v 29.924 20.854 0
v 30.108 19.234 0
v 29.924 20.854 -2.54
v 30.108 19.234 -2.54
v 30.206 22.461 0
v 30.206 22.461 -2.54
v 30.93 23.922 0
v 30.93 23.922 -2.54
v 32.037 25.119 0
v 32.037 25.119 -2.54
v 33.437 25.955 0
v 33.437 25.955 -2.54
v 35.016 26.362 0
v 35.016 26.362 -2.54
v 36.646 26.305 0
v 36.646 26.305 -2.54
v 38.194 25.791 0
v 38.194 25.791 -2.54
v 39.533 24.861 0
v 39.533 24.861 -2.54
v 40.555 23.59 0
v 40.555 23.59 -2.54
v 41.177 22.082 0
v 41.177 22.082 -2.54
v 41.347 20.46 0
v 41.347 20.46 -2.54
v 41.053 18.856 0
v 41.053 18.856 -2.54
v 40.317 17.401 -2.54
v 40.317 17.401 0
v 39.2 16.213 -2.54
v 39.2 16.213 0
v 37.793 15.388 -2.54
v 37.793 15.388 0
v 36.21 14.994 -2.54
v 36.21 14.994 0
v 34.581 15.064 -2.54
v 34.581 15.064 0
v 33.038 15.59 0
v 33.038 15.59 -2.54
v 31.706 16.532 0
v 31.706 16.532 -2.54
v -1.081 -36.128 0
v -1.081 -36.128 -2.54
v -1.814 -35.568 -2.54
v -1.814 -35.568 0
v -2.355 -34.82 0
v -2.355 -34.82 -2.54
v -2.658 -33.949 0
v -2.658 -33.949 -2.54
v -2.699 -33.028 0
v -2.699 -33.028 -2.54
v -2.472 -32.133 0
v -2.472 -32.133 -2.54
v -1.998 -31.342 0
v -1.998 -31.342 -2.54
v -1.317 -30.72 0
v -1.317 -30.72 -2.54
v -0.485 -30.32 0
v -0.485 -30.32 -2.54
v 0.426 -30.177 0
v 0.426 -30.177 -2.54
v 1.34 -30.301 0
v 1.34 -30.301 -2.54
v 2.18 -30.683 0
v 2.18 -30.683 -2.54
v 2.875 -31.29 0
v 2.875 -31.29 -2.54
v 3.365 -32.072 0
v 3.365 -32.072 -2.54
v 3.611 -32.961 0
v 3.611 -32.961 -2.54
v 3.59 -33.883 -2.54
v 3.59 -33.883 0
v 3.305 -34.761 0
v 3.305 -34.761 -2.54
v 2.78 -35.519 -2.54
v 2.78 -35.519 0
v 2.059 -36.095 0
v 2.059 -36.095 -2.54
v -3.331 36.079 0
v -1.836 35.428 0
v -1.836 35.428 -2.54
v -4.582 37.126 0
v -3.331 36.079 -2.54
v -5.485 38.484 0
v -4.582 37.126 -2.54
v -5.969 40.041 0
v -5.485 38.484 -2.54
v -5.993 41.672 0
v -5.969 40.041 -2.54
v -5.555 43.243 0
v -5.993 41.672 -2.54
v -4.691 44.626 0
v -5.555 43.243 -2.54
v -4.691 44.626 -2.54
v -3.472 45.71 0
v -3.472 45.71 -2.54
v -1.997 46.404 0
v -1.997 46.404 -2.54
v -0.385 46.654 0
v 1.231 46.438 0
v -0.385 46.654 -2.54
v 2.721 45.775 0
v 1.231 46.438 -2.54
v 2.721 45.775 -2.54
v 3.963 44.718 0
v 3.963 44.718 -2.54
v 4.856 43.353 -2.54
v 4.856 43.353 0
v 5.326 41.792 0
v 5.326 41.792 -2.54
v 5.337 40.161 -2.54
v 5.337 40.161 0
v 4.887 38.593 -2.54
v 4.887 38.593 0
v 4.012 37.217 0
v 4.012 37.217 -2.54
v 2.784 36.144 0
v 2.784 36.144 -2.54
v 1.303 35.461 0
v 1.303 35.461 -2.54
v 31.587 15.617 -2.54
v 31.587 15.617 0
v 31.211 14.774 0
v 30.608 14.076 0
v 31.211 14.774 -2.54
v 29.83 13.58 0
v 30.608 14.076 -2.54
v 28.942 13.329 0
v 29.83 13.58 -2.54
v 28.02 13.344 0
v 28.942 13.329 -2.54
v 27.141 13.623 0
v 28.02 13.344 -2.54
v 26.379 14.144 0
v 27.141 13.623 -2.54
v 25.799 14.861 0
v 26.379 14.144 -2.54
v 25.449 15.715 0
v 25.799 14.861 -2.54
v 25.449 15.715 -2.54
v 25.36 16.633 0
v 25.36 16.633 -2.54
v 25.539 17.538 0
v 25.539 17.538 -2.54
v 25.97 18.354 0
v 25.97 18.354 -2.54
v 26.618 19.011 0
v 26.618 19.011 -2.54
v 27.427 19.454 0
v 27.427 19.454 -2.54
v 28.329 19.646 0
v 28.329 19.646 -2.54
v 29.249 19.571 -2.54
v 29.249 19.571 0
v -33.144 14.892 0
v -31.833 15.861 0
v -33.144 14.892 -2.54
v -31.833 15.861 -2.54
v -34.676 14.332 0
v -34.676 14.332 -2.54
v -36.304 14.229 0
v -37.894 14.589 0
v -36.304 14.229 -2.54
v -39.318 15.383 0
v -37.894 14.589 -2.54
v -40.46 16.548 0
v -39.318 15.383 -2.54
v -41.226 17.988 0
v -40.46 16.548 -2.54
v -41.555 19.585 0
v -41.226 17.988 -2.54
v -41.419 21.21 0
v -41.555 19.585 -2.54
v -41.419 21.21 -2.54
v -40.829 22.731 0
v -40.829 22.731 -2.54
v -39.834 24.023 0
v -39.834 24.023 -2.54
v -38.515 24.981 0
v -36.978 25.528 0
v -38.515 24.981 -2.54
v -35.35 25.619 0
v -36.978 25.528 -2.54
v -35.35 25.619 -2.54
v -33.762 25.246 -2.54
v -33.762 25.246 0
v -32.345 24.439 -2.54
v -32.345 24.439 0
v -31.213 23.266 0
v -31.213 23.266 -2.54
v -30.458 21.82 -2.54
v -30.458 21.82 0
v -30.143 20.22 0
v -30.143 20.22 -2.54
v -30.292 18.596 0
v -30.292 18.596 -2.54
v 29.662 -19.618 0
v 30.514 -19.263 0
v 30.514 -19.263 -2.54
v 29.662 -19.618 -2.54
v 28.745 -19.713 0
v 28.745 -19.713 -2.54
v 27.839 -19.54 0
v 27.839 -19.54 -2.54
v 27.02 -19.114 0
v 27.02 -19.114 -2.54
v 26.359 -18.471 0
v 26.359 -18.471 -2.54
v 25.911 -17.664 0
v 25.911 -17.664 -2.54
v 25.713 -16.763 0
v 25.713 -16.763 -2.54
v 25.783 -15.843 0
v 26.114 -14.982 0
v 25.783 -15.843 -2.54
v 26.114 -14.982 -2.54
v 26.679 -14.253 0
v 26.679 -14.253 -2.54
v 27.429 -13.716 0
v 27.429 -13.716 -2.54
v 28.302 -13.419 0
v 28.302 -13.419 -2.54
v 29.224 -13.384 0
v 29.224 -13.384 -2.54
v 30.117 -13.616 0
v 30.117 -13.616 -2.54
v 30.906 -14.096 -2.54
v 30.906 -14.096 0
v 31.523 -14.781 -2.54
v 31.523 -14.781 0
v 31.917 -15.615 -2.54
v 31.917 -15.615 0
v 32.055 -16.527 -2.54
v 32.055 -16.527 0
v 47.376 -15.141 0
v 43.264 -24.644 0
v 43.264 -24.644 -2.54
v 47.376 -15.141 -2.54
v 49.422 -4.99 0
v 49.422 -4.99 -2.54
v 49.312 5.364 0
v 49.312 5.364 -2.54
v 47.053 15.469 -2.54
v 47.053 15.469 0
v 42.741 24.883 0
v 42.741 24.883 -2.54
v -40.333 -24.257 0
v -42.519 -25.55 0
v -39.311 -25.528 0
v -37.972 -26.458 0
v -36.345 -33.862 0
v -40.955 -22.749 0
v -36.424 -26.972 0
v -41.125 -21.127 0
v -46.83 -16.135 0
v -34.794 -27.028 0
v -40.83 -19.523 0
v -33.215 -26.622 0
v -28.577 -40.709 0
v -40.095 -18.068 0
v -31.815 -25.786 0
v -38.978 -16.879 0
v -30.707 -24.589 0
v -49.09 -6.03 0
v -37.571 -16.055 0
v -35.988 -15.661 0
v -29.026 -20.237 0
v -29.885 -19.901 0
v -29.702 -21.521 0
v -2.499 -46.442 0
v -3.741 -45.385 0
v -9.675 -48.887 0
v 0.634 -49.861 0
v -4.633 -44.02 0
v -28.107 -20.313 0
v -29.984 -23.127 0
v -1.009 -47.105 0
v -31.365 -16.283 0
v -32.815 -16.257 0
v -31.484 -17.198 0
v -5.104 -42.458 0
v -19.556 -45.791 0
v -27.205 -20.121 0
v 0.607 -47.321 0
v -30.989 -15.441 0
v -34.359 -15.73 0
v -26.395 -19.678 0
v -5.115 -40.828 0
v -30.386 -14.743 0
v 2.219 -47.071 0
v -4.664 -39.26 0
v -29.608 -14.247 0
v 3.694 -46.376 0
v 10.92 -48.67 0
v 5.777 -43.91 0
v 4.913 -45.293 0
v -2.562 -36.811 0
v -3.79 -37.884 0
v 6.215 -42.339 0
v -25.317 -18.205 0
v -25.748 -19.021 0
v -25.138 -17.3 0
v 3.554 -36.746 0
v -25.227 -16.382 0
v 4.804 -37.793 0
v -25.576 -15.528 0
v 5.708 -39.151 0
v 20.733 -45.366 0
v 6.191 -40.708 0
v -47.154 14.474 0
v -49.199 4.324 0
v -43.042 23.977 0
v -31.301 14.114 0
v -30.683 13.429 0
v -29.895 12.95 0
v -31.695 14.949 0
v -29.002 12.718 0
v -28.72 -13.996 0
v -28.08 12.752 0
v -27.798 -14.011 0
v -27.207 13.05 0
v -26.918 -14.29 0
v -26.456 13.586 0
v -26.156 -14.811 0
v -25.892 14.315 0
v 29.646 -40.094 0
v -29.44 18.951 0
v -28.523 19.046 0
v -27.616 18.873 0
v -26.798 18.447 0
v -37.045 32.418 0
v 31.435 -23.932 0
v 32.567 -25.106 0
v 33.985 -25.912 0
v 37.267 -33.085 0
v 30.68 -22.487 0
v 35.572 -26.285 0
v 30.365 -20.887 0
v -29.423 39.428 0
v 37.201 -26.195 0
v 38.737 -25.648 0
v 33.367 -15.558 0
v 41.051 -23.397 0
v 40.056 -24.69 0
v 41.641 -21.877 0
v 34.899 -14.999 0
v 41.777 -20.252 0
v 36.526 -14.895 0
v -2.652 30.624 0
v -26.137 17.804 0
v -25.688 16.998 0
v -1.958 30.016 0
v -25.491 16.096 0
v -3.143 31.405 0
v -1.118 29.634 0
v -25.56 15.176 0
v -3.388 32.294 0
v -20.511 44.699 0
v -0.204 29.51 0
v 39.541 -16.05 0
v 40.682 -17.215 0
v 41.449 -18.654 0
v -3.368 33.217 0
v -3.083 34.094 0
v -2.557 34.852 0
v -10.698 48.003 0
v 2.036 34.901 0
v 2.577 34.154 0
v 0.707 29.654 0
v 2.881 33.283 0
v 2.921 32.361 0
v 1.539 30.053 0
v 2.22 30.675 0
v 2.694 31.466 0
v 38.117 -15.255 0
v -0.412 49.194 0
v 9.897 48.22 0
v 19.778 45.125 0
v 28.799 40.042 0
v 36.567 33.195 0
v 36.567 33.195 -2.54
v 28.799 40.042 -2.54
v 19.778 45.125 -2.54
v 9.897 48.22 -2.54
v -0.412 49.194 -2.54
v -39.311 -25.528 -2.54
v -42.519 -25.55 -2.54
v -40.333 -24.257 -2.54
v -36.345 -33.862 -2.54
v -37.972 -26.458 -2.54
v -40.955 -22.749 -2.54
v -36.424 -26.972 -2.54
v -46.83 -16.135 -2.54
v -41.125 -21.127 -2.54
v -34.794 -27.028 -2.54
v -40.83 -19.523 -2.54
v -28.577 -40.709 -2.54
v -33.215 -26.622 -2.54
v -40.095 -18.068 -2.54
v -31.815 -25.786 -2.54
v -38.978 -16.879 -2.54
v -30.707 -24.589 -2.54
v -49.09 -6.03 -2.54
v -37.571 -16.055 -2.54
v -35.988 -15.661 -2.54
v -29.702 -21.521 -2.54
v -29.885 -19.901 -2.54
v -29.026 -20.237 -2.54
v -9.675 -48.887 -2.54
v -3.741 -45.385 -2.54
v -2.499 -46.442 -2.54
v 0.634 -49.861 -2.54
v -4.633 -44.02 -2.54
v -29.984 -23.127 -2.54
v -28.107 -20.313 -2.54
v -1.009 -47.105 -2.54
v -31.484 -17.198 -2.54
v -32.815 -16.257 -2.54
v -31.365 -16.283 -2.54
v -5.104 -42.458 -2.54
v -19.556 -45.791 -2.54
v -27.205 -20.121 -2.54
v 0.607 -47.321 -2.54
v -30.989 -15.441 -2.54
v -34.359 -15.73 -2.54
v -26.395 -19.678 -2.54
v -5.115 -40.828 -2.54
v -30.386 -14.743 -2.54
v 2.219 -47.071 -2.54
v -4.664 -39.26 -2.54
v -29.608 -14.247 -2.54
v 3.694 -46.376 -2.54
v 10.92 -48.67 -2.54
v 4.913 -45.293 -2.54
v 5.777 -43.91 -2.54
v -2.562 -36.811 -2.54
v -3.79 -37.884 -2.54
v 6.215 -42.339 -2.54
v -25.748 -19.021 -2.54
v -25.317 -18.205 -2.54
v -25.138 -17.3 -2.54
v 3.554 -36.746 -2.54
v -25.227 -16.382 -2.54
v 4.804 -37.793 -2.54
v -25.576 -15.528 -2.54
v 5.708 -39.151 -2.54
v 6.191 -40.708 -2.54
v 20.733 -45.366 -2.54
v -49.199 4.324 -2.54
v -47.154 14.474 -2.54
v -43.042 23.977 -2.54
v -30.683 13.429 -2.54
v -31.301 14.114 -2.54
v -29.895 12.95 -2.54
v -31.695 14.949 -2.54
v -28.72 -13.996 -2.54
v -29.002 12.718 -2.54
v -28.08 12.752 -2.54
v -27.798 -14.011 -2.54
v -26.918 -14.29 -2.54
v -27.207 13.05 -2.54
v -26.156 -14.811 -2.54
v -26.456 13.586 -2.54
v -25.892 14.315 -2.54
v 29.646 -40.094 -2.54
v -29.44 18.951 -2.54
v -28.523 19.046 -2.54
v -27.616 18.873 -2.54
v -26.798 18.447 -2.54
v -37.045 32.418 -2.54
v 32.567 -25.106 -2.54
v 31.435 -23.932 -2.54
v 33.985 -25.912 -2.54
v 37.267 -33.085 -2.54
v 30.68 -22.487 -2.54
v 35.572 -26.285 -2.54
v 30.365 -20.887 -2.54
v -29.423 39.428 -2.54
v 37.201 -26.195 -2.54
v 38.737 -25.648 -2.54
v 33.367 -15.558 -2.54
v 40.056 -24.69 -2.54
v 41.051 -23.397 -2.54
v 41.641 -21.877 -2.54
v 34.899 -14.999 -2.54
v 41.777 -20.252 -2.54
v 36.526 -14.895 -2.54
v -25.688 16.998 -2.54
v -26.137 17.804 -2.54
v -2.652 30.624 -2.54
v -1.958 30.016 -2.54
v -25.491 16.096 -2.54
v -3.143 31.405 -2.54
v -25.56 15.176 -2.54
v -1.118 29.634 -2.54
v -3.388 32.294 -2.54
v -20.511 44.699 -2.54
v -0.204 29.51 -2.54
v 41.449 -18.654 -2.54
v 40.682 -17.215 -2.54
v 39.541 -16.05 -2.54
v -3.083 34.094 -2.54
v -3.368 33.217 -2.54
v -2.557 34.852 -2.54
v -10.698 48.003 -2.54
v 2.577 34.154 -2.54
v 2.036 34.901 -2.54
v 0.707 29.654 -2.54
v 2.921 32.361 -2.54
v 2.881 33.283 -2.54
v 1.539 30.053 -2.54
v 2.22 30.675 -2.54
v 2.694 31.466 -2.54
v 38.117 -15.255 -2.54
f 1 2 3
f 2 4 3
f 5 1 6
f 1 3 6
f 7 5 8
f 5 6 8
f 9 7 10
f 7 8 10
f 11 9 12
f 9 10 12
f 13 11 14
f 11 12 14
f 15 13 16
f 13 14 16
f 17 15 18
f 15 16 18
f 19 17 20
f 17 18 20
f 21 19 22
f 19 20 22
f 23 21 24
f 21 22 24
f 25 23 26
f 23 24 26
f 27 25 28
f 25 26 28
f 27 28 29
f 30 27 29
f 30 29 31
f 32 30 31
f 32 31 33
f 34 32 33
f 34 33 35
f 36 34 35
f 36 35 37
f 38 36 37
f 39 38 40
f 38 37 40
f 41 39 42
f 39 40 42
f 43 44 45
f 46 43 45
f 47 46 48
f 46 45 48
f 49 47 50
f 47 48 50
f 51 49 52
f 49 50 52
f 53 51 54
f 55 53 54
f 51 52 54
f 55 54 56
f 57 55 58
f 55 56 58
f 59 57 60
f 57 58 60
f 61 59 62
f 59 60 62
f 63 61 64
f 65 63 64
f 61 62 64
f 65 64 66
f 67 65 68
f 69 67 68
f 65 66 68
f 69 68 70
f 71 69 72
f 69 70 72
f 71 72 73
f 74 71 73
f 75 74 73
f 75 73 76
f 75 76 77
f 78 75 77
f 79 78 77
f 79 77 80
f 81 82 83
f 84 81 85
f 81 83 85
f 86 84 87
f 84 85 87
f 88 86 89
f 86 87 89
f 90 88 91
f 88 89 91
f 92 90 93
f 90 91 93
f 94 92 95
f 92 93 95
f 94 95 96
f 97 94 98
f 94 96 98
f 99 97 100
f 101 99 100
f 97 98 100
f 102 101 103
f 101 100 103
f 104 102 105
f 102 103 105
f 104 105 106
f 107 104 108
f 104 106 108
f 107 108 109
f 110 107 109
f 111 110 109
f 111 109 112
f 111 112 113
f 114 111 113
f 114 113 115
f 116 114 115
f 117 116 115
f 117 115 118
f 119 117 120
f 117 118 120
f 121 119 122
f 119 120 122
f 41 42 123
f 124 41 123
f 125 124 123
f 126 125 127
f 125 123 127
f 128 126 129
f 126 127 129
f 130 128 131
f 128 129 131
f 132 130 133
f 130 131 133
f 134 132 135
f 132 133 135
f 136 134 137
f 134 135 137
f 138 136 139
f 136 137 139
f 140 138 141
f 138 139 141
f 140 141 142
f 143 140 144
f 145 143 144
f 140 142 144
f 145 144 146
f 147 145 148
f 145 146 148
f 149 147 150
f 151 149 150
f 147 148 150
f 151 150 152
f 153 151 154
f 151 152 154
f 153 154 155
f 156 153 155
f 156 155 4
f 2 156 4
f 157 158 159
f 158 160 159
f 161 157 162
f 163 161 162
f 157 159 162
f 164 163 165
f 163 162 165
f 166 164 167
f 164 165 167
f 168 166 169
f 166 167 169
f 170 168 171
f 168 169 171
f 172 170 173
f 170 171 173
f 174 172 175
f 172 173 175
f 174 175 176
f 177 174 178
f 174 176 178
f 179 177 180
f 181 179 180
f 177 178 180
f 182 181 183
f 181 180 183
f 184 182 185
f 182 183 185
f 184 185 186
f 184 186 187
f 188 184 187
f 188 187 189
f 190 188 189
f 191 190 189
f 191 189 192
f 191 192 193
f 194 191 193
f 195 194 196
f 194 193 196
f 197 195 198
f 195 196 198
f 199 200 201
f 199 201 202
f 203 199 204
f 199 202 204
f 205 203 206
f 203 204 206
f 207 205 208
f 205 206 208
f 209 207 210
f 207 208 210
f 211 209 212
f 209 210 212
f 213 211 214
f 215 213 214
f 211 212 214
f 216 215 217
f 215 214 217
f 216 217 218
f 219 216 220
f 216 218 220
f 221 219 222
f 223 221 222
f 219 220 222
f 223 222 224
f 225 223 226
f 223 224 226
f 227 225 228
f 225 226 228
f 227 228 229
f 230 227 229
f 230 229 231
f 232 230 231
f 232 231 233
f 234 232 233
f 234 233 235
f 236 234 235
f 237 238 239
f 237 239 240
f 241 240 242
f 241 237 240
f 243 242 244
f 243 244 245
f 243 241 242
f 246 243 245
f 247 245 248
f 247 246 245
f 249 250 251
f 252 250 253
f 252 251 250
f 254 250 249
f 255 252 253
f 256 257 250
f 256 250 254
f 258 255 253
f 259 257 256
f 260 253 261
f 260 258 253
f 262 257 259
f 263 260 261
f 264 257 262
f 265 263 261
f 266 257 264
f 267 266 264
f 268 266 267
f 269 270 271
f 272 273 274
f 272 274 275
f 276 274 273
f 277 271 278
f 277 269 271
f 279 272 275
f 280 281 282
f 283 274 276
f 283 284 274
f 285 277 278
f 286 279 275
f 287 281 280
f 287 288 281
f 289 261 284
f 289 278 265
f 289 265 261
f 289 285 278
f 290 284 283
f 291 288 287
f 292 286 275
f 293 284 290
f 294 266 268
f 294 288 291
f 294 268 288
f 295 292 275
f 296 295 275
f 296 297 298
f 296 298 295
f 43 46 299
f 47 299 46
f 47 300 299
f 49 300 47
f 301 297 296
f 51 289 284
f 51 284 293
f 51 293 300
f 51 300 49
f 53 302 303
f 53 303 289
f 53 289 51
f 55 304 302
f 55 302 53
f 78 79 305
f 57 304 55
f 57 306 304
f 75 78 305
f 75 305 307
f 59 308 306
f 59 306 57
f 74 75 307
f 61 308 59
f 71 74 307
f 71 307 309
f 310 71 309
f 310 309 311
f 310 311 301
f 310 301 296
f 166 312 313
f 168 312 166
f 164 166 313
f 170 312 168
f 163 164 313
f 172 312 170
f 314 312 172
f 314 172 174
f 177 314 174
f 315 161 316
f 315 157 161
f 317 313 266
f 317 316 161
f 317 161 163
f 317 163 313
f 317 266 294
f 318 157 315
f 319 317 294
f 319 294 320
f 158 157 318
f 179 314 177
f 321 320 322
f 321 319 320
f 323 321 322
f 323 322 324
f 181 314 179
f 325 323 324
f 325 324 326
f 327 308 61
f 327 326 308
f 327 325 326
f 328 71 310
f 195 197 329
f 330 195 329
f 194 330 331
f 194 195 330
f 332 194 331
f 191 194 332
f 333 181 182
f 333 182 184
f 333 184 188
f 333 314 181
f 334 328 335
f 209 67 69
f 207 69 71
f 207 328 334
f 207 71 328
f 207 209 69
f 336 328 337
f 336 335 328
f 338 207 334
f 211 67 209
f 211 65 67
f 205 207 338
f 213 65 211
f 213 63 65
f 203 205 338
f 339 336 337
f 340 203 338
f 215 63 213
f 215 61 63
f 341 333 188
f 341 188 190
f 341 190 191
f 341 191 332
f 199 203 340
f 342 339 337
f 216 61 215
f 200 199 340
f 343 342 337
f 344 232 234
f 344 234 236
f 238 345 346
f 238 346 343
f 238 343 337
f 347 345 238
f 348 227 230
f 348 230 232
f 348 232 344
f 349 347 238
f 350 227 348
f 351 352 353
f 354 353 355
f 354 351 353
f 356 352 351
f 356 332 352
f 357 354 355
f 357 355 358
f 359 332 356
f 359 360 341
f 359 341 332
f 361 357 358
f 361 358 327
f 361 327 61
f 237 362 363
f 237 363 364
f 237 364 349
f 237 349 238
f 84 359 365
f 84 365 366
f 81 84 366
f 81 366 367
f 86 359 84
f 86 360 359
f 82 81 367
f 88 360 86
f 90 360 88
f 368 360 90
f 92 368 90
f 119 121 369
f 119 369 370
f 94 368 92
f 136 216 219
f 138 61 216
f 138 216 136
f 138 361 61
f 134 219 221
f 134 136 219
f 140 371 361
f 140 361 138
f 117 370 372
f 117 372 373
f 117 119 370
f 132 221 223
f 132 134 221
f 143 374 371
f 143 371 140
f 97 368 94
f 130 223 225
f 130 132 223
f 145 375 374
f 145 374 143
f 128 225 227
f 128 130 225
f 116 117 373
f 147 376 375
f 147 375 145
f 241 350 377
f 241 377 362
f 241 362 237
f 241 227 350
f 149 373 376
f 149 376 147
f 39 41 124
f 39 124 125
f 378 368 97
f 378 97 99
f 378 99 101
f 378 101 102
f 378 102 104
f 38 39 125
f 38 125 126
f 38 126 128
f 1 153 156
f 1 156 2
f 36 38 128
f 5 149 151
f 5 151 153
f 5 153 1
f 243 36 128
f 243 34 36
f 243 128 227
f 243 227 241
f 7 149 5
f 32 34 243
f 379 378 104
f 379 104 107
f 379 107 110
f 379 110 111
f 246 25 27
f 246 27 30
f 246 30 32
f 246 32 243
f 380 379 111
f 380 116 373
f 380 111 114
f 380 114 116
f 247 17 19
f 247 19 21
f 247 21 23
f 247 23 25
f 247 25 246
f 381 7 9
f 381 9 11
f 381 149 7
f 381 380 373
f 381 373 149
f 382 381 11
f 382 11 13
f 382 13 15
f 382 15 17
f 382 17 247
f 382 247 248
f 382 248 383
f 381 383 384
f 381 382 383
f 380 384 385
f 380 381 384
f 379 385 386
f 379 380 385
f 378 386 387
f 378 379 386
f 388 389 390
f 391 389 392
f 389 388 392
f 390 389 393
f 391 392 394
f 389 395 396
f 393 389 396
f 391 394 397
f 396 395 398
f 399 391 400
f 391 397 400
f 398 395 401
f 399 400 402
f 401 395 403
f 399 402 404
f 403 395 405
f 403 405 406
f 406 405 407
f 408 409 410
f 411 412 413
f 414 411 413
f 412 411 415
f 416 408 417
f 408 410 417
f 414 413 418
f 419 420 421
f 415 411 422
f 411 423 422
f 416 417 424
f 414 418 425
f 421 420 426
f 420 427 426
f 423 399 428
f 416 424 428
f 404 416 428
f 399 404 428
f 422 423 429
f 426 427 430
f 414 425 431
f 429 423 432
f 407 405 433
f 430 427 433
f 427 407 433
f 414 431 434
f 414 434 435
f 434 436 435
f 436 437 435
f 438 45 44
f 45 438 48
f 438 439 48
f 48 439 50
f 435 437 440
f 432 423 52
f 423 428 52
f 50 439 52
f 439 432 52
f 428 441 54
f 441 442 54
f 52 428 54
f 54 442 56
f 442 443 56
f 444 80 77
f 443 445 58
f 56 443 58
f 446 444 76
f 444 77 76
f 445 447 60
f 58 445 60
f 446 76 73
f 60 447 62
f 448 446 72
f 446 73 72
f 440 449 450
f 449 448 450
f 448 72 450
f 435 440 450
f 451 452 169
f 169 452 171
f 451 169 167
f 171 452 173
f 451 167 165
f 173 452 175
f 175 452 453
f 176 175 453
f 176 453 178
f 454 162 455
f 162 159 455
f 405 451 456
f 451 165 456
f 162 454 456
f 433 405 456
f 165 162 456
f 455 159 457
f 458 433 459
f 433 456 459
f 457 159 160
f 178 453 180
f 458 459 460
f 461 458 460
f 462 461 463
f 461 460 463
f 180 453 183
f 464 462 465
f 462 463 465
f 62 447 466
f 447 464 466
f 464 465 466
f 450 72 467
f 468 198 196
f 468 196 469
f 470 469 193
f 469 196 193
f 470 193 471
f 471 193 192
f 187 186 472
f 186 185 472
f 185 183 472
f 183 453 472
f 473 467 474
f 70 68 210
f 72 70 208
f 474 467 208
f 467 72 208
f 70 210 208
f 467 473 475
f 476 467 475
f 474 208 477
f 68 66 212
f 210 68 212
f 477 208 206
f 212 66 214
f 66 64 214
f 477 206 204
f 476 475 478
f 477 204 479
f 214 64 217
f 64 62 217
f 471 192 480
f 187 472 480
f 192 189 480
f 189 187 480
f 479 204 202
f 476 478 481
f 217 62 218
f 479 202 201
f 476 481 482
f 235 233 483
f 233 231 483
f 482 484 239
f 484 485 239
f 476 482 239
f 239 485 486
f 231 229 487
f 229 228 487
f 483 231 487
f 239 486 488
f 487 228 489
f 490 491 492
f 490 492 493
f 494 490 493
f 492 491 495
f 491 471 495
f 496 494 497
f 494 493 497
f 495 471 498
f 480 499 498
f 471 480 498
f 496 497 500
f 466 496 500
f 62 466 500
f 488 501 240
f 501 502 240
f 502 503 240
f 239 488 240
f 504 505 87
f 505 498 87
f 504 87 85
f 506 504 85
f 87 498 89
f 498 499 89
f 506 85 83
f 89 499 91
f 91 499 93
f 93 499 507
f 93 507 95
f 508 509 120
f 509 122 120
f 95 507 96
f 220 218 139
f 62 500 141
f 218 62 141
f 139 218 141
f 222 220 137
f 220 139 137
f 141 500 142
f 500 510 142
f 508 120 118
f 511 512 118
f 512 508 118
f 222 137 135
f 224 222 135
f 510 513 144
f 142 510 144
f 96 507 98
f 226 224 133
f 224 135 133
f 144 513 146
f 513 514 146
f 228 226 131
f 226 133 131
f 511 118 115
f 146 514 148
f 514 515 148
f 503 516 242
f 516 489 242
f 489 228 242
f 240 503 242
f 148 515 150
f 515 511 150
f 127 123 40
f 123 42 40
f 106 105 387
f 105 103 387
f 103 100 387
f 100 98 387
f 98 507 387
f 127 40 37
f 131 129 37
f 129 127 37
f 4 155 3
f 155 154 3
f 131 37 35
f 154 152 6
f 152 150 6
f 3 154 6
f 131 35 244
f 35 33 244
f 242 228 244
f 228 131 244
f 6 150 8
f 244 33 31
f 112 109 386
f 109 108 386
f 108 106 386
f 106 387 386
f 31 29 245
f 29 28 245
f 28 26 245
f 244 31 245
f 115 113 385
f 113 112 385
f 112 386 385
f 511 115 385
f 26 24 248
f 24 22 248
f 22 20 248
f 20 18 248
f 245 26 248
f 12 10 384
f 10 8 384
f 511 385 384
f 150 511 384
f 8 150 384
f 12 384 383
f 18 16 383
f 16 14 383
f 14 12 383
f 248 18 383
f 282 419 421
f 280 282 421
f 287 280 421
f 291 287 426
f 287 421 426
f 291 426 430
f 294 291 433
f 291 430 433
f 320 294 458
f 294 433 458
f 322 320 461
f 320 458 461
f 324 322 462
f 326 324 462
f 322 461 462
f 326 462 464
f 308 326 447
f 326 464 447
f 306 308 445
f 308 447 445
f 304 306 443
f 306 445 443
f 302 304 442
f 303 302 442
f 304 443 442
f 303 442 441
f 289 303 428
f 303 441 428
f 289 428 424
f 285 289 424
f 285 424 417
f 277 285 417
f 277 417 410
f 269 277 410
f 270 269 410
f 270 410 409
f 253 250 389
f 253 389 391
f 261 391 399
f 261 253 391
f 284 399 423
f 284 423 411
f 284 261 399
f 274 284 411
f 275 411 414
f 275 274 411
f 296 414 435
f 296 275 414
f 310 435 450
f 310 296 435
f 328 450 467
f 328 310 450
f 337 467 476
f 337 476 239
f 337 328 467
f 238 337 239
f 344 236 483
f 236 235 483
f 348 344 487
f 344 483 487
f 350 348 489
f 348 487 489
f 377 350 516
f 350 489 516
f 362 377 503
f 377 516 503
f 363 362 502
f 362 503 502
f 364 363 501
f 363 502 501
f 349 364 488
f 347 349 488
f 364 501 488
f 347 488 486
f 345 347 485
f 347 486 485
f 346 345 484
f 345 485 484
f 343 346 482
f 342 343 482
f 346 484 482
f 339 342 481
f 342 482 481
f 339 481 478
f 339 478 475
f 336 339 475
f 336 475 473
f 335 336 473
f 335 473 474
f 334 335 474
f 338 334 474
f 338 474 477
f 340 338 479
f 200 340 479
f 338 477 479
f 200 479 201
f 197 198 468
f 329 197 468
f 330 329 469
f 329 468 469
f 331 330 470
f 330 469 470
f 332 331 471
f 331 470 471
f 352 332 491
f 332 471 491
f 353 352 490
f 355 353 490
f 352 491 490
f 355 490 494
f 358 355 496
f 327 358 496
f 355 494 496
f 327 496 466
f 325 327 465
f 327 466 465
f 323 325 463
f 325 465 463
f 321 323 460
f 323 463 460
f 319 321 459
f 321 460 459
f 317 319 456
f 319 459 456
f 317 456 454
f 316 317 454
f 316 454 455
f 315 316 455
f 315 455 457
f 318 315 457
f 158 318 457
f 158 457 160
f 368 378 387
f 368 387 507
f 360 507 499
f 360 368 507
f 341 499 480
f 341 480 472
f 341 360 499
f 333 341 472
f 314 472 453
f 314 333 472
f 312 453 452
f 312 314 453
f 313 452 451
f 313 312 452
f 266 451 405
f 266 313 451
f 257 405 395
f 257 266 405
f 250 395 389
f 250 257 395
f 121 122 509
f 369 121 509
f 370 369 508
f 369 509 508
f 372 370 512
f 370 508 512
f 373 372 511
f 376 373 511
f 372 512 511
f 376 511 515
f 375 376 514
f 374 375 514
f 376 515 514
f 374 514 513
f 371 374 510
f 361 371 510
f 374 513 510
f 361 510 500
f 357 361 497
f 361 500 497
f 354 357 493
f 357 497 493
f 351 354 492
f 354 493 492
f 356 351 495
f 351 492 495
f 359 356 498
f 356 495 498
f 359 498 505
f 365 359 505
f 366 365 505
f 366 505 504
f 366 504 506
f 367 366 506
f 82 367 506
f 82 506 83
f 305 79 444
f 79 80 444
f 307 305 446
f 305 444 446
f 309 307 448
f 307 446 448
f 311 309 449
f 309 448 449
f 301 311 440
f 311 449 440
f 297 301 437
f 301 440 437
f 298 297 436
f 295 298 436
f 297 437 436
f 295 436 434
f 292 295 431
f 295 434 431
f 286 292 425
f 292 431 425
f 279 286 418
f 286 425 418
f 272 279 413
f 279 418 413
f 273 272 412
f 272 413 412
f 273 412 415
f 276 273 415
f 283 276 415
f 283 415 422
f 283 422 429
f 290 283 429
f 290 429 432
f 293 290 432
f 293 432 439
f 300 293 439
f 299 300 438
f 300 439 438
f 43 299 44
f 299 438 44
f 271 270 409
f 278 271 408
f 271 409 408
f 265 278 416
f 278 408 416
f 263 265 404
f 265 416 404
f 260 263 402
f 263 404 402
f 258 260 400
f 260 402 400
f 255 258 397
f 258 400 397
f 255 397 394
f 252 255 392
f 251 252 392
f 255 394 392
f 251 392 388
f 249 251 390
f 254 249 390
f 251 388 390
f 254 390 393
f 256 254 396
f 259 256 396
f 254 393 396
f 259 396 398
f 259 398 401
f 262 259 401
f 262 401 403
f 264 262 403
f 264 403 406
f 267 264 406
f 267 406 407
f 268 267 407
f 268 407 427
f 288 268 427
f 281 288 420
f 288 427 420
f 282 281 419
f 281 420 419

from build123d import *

# Parameters (mm, degrees)
F1_DEPTH = 2.54
F2_D     = 11.43
F3_D     = 6.35


with BuildPart() as f1:
    # F0 (on Top) → F1 (new body)
    with BuildSketch(Plane.XY):
        with BuildLine():
            ThreePointArc((14.1469296791, 24.581208667), (28.3570527779, 32.9867129725), (42.7414945684, 24.8831374968))
            ThreePointArc((42.7414945684, 24.8831374968), (24.4218518628, 42.8199500657), (-0.4118303798, 49.1938641112))
            ThreePointArc((-0.4118303798, 49.1938641112), (11.3750266033, 44.4205864041), (16.2724880694, 32.6847843949))
            ThreePointArc((16.2724880694, 32.6847843949), (15.7322599992, 28.495931985), (14.1469296791, 24.581208667))
        make_face()
        with BuildLine():
            ThreePointArc((-14.4476350188, 24.2792801377), (-14.6219536378, 40.7883599496), (-0.4118303798, 49.1938641112))
            ThreePointArc((-0.4118303798, 49.1938641112), (-25.1053870129, 42.2969945819), (-43.0421996808, 23.9773521233))
            ThreePointArc((-43.0421996808, 23.9773521233), (-28.8320764588, 32.3828558193), (-14.4476350188, 24.2792801377))
        make_face()
        with BuildLine():
            ThreePointArc((-28.4834395144, -0.6353036127), (-42.8678814784, 7.4682721021), (-43.0421996808, 23.9773521233))
            ThreePointArc((-43.0421996808, 23.9773521233), (-49.4161139914, -0.8563299278), (-42.5192447927, -25.5498866402))
            ThreePointArc((-42.5192447927, -25.5498866402), (-42.6935625622, -9.0408072614), (-28.4834395144, -0.6353036127))
        make_face()
        with BuildLine():
            ThreePointArc((-42.5192447927, -25.5498866402), (-24.1996024135, -43.4866996437), (0.6340797732, -49.8606141921))
            ThreePointArc((0.6340797732, -49.8606141921), (-13.7503612776, -41.757037972), (-13.9246792181, -25.2479584958))
            ThreePointArc((-13.9246792181, -25.2479584958), (-28.1348028533, -33.6534630478), (-42.5192447927, -25.5498866402))
        make_face()
        with BuildLine():
            ThreePointArc((0.6340797732, -49.8606141921), (25.3276368535, -42.9637449392), (43.2644499105, -24.6441023627))
            ThreePointArc((43.2644499105, -24.6441023627), (29.0543267516, -33.0496058908), (14.6698854093, -24.9460303205))
            ThreePointArc((14.6698854093, -24.9460303205), (16.3844166198, -28.9943010133), (16.969762255, -33.351534466))
            ThreePointArc((16.969762255, -33.351534466), (12.1955639367, -44.9640733309), (0.6340797732, -49.8606141921))
        make_face()
        with BuildLine():
            ThreePointArc((43.2644499105, -24.6441023627), (48.0204409306, -12.8999323449), (49.6411251622, -0.3333750356))
            ThreePointArc((49.6411251622, -0.3333750356), (47.8850882419, 12.7383253763), (42.7414945684, 24.8831374968))
            ThreePointArc((42.7414945684, 24.8831374968), (44.4560258195, 20.8348667633), (45.0413714688, 16.4776332587))
            ThreePointArc((45.0413714688, 16.4776332587), (40.2671733446, 4.86509459), (28.7056895388, -0.0314464615))
            ThreePointArc((28.7056895388, -0.0314464615), (40.4925468917, -4.8047239608), (45.3900085616, -16.5405261717))
            ThreePointArc((45.3900085616, -16.5405261717), (44.8497804239, -20.7293788387), (43.2644499105, -24.6441023627))
        make_face()
        with BuildLine():
            ThreePointArc((14.6698854093, -24.9460303205), (29.0543267516, -33.0496058908), (43.2644499105, -24.6441023627))
            ThreePointArc((43.2644499105, -24.6441023627), (44.8497804239, -20.7293788387), (45.3900085616, -16.5405261717))
            ThreePointArc((45.3900085616, -16.5405261717), (40.4925468917, -4.8047239608), (28.7056895388, -0.0314464615))
            ThreePointArc((28.7056895388, -0.0314464615), (14.4955667445, -8.436950812), (14.6698854093, -24.9460303205))
        make_face()
        with BuildLine():
            ThreePointArc((-13.9246792181, -25.2479584958), (-13.7503612776, -41.757037972), (0.6340797732, -49.8606141921))
            ThreePointArc((0.6340797732, -49.8606141921), (12.1955639367, -44.9640733309), (16.969762255, -33.351534466))
            ThreePointArc((16.969762255, -33.351534466), (16.3844166198, -28.9943010133), (14.6698854093, -24.9460303205))
            ThreePointArc((14.6698854093, -24.9460303205), (0.2854439404, -16.8424547484), (-13.9246792181, -25.2479584958))
        make_face()
        with BuildLine():
            ThreePointArc((-28.4834395144, -0.6353036127), (-42.6935625622, -9.0408072614), (-42.5192447927, -25.5498866402))
            ThreePointArc((-42.5192447927, -25.5498866402), (-28.1348028533, -33.6534630478), (-13.9246792181, -25.2479584958))
            ThreePointArc((-13.9246792181, -25.2479584958), (-12.3393491328, -21.3332354278), (-11.7991211444, -17.1443833299))
            ThreePointArc((-11.7991211444, -17.1443833299), (-16.6965825823, -5.4085813485), (-28.4834395144, -0.6353036127))
        make_face()
        with BuildLine():
            ThreePointArc((-14.4476350188, 24.2792801377), (-28.8320764588, 32.3828558193), (-43.0421996808, 23.9773521233))
            ThreePointArc((-43.0421996808, 23.9773521233), (-42.8678814784, 7.4682721021), (-28.4834395144, -0.6353036127))
            ThreePointArc((-28.4834395144, -0.6353036127), (-16.9219561318, 4.2612376639), (-12.1477582372, 15.8737761006))
            ThreePointArc((-12.1477582372, 15.8737761006), (-12.7331038558, 20.2310094926), (-14.4476350188, 24.2792801377))
        make_face()
        with BuildLine():
            ThreePointArc((16.2724880694, 32.6847843949), (11.3750266033, 44.4205864041), (-0.4118303798, 49.1938641112))
            ThreePointArc((-0.4118303798, 49.1938641112), (-14.6219536378, 40.7883599496), (-14.4476350188, 24.2792801377))
            ThreePointArc((-14.4476350188, 24.2792801377), (-0.0631934119, 16.1757046794), (14.1469296791, 24.581208667))
            ThreePointArc((14.1469296791, 24.581208667), (15.7322599992, 28.495931985), (16.2724880694, 32.6847843949))
        make_face()
        with BuildLine():
            ThreePointArc((45.0413714688, 16.4776332587), (44.4560258195, 20.8348667633), (42.7414945684, 24.8831374968))
            ThreePointArc((42.7414945684, 24.8831374968), (28.3570527779, 32.9867129725), (14.1469296791, 24.581208667))
            ThreePointArc((14.1469296791, 24.581208667), (14.3212482409, 8.0721292377), (28.7056895388, -0.0314464615))
            ThreePointArc((28.7056895388, -0.0314464615), (40.2671733446, 4.86509459), (45.0413714688, 16.4776332587))
        make_face()
        with BuildLine():
            ThreePointArc((28.7056895388, -0.0314464615), (14.3212482409, 8.0721292377), (14.1469296791, 24.581208667))
            ThreePointArc((14.1469296791, 24.581208667), (-0.0631934119, 16.1757046794), (-14.4476350188, 24.2792801377))
            ThreePointArc((-14.4476350188, 24.2792801377), (-12.7331038558, 20.2310094926), (-12.1477582372, 15.8737761006))
            ThreePointArc((-12.1477582372, 15.8737761006), (-16.9219561318, 4.2612376639), (-28.4834395144, -0.6353036127))
            ThreePointArc((-28.4834395144, -0.6353036127), (-16.6965825823, -5.4085813485), (-11.7991211444, -17.1443833299))
            ThreePointArc((-11.7991211444, -17.1443833299), (-12.3393491328, -21.3332354278), (-13.9246792181, -25.2479584958))
            ThreePointArc((-13.9246792181, -25.2479584958), (0.2854439404, -16.8424547484), (14.6698854093, -24.9460303205))
            ThreePointArc((14.6698854093, -24.9460303205), (14.4955667445, -8.436950812), (28.7056895388, -0.0314464615))
        make_face()
    extrude(amount=-F1_DEPTH)

    # F2 (through all)
    with Locations(Plane.XY):
        with Locations((-0.3246712038, 40.9393242526), (35.6364330455, 20.6803853323), (36.0722294115, -20.5923139558), (0.5469215282, -41.6060743237), (-35.4141827211, -21.3471354034), (-35.849979087, 19.9255638847)):
            Hole(F2_D / 2)

    # F3 (through all)
    with Locations(Plane.XY):
        with Locations((-28.6577582372, 15.8737761006), (-0.2375119306, 32.6847843949), (28.5313714688, 16.4776332587), (28.8800085616, -16.5405261717), (0.459762255, -33.351534466), (-28.3091211444, -17.1443833299)):
            Hole(F3_D / 2)


solid = f1.part
